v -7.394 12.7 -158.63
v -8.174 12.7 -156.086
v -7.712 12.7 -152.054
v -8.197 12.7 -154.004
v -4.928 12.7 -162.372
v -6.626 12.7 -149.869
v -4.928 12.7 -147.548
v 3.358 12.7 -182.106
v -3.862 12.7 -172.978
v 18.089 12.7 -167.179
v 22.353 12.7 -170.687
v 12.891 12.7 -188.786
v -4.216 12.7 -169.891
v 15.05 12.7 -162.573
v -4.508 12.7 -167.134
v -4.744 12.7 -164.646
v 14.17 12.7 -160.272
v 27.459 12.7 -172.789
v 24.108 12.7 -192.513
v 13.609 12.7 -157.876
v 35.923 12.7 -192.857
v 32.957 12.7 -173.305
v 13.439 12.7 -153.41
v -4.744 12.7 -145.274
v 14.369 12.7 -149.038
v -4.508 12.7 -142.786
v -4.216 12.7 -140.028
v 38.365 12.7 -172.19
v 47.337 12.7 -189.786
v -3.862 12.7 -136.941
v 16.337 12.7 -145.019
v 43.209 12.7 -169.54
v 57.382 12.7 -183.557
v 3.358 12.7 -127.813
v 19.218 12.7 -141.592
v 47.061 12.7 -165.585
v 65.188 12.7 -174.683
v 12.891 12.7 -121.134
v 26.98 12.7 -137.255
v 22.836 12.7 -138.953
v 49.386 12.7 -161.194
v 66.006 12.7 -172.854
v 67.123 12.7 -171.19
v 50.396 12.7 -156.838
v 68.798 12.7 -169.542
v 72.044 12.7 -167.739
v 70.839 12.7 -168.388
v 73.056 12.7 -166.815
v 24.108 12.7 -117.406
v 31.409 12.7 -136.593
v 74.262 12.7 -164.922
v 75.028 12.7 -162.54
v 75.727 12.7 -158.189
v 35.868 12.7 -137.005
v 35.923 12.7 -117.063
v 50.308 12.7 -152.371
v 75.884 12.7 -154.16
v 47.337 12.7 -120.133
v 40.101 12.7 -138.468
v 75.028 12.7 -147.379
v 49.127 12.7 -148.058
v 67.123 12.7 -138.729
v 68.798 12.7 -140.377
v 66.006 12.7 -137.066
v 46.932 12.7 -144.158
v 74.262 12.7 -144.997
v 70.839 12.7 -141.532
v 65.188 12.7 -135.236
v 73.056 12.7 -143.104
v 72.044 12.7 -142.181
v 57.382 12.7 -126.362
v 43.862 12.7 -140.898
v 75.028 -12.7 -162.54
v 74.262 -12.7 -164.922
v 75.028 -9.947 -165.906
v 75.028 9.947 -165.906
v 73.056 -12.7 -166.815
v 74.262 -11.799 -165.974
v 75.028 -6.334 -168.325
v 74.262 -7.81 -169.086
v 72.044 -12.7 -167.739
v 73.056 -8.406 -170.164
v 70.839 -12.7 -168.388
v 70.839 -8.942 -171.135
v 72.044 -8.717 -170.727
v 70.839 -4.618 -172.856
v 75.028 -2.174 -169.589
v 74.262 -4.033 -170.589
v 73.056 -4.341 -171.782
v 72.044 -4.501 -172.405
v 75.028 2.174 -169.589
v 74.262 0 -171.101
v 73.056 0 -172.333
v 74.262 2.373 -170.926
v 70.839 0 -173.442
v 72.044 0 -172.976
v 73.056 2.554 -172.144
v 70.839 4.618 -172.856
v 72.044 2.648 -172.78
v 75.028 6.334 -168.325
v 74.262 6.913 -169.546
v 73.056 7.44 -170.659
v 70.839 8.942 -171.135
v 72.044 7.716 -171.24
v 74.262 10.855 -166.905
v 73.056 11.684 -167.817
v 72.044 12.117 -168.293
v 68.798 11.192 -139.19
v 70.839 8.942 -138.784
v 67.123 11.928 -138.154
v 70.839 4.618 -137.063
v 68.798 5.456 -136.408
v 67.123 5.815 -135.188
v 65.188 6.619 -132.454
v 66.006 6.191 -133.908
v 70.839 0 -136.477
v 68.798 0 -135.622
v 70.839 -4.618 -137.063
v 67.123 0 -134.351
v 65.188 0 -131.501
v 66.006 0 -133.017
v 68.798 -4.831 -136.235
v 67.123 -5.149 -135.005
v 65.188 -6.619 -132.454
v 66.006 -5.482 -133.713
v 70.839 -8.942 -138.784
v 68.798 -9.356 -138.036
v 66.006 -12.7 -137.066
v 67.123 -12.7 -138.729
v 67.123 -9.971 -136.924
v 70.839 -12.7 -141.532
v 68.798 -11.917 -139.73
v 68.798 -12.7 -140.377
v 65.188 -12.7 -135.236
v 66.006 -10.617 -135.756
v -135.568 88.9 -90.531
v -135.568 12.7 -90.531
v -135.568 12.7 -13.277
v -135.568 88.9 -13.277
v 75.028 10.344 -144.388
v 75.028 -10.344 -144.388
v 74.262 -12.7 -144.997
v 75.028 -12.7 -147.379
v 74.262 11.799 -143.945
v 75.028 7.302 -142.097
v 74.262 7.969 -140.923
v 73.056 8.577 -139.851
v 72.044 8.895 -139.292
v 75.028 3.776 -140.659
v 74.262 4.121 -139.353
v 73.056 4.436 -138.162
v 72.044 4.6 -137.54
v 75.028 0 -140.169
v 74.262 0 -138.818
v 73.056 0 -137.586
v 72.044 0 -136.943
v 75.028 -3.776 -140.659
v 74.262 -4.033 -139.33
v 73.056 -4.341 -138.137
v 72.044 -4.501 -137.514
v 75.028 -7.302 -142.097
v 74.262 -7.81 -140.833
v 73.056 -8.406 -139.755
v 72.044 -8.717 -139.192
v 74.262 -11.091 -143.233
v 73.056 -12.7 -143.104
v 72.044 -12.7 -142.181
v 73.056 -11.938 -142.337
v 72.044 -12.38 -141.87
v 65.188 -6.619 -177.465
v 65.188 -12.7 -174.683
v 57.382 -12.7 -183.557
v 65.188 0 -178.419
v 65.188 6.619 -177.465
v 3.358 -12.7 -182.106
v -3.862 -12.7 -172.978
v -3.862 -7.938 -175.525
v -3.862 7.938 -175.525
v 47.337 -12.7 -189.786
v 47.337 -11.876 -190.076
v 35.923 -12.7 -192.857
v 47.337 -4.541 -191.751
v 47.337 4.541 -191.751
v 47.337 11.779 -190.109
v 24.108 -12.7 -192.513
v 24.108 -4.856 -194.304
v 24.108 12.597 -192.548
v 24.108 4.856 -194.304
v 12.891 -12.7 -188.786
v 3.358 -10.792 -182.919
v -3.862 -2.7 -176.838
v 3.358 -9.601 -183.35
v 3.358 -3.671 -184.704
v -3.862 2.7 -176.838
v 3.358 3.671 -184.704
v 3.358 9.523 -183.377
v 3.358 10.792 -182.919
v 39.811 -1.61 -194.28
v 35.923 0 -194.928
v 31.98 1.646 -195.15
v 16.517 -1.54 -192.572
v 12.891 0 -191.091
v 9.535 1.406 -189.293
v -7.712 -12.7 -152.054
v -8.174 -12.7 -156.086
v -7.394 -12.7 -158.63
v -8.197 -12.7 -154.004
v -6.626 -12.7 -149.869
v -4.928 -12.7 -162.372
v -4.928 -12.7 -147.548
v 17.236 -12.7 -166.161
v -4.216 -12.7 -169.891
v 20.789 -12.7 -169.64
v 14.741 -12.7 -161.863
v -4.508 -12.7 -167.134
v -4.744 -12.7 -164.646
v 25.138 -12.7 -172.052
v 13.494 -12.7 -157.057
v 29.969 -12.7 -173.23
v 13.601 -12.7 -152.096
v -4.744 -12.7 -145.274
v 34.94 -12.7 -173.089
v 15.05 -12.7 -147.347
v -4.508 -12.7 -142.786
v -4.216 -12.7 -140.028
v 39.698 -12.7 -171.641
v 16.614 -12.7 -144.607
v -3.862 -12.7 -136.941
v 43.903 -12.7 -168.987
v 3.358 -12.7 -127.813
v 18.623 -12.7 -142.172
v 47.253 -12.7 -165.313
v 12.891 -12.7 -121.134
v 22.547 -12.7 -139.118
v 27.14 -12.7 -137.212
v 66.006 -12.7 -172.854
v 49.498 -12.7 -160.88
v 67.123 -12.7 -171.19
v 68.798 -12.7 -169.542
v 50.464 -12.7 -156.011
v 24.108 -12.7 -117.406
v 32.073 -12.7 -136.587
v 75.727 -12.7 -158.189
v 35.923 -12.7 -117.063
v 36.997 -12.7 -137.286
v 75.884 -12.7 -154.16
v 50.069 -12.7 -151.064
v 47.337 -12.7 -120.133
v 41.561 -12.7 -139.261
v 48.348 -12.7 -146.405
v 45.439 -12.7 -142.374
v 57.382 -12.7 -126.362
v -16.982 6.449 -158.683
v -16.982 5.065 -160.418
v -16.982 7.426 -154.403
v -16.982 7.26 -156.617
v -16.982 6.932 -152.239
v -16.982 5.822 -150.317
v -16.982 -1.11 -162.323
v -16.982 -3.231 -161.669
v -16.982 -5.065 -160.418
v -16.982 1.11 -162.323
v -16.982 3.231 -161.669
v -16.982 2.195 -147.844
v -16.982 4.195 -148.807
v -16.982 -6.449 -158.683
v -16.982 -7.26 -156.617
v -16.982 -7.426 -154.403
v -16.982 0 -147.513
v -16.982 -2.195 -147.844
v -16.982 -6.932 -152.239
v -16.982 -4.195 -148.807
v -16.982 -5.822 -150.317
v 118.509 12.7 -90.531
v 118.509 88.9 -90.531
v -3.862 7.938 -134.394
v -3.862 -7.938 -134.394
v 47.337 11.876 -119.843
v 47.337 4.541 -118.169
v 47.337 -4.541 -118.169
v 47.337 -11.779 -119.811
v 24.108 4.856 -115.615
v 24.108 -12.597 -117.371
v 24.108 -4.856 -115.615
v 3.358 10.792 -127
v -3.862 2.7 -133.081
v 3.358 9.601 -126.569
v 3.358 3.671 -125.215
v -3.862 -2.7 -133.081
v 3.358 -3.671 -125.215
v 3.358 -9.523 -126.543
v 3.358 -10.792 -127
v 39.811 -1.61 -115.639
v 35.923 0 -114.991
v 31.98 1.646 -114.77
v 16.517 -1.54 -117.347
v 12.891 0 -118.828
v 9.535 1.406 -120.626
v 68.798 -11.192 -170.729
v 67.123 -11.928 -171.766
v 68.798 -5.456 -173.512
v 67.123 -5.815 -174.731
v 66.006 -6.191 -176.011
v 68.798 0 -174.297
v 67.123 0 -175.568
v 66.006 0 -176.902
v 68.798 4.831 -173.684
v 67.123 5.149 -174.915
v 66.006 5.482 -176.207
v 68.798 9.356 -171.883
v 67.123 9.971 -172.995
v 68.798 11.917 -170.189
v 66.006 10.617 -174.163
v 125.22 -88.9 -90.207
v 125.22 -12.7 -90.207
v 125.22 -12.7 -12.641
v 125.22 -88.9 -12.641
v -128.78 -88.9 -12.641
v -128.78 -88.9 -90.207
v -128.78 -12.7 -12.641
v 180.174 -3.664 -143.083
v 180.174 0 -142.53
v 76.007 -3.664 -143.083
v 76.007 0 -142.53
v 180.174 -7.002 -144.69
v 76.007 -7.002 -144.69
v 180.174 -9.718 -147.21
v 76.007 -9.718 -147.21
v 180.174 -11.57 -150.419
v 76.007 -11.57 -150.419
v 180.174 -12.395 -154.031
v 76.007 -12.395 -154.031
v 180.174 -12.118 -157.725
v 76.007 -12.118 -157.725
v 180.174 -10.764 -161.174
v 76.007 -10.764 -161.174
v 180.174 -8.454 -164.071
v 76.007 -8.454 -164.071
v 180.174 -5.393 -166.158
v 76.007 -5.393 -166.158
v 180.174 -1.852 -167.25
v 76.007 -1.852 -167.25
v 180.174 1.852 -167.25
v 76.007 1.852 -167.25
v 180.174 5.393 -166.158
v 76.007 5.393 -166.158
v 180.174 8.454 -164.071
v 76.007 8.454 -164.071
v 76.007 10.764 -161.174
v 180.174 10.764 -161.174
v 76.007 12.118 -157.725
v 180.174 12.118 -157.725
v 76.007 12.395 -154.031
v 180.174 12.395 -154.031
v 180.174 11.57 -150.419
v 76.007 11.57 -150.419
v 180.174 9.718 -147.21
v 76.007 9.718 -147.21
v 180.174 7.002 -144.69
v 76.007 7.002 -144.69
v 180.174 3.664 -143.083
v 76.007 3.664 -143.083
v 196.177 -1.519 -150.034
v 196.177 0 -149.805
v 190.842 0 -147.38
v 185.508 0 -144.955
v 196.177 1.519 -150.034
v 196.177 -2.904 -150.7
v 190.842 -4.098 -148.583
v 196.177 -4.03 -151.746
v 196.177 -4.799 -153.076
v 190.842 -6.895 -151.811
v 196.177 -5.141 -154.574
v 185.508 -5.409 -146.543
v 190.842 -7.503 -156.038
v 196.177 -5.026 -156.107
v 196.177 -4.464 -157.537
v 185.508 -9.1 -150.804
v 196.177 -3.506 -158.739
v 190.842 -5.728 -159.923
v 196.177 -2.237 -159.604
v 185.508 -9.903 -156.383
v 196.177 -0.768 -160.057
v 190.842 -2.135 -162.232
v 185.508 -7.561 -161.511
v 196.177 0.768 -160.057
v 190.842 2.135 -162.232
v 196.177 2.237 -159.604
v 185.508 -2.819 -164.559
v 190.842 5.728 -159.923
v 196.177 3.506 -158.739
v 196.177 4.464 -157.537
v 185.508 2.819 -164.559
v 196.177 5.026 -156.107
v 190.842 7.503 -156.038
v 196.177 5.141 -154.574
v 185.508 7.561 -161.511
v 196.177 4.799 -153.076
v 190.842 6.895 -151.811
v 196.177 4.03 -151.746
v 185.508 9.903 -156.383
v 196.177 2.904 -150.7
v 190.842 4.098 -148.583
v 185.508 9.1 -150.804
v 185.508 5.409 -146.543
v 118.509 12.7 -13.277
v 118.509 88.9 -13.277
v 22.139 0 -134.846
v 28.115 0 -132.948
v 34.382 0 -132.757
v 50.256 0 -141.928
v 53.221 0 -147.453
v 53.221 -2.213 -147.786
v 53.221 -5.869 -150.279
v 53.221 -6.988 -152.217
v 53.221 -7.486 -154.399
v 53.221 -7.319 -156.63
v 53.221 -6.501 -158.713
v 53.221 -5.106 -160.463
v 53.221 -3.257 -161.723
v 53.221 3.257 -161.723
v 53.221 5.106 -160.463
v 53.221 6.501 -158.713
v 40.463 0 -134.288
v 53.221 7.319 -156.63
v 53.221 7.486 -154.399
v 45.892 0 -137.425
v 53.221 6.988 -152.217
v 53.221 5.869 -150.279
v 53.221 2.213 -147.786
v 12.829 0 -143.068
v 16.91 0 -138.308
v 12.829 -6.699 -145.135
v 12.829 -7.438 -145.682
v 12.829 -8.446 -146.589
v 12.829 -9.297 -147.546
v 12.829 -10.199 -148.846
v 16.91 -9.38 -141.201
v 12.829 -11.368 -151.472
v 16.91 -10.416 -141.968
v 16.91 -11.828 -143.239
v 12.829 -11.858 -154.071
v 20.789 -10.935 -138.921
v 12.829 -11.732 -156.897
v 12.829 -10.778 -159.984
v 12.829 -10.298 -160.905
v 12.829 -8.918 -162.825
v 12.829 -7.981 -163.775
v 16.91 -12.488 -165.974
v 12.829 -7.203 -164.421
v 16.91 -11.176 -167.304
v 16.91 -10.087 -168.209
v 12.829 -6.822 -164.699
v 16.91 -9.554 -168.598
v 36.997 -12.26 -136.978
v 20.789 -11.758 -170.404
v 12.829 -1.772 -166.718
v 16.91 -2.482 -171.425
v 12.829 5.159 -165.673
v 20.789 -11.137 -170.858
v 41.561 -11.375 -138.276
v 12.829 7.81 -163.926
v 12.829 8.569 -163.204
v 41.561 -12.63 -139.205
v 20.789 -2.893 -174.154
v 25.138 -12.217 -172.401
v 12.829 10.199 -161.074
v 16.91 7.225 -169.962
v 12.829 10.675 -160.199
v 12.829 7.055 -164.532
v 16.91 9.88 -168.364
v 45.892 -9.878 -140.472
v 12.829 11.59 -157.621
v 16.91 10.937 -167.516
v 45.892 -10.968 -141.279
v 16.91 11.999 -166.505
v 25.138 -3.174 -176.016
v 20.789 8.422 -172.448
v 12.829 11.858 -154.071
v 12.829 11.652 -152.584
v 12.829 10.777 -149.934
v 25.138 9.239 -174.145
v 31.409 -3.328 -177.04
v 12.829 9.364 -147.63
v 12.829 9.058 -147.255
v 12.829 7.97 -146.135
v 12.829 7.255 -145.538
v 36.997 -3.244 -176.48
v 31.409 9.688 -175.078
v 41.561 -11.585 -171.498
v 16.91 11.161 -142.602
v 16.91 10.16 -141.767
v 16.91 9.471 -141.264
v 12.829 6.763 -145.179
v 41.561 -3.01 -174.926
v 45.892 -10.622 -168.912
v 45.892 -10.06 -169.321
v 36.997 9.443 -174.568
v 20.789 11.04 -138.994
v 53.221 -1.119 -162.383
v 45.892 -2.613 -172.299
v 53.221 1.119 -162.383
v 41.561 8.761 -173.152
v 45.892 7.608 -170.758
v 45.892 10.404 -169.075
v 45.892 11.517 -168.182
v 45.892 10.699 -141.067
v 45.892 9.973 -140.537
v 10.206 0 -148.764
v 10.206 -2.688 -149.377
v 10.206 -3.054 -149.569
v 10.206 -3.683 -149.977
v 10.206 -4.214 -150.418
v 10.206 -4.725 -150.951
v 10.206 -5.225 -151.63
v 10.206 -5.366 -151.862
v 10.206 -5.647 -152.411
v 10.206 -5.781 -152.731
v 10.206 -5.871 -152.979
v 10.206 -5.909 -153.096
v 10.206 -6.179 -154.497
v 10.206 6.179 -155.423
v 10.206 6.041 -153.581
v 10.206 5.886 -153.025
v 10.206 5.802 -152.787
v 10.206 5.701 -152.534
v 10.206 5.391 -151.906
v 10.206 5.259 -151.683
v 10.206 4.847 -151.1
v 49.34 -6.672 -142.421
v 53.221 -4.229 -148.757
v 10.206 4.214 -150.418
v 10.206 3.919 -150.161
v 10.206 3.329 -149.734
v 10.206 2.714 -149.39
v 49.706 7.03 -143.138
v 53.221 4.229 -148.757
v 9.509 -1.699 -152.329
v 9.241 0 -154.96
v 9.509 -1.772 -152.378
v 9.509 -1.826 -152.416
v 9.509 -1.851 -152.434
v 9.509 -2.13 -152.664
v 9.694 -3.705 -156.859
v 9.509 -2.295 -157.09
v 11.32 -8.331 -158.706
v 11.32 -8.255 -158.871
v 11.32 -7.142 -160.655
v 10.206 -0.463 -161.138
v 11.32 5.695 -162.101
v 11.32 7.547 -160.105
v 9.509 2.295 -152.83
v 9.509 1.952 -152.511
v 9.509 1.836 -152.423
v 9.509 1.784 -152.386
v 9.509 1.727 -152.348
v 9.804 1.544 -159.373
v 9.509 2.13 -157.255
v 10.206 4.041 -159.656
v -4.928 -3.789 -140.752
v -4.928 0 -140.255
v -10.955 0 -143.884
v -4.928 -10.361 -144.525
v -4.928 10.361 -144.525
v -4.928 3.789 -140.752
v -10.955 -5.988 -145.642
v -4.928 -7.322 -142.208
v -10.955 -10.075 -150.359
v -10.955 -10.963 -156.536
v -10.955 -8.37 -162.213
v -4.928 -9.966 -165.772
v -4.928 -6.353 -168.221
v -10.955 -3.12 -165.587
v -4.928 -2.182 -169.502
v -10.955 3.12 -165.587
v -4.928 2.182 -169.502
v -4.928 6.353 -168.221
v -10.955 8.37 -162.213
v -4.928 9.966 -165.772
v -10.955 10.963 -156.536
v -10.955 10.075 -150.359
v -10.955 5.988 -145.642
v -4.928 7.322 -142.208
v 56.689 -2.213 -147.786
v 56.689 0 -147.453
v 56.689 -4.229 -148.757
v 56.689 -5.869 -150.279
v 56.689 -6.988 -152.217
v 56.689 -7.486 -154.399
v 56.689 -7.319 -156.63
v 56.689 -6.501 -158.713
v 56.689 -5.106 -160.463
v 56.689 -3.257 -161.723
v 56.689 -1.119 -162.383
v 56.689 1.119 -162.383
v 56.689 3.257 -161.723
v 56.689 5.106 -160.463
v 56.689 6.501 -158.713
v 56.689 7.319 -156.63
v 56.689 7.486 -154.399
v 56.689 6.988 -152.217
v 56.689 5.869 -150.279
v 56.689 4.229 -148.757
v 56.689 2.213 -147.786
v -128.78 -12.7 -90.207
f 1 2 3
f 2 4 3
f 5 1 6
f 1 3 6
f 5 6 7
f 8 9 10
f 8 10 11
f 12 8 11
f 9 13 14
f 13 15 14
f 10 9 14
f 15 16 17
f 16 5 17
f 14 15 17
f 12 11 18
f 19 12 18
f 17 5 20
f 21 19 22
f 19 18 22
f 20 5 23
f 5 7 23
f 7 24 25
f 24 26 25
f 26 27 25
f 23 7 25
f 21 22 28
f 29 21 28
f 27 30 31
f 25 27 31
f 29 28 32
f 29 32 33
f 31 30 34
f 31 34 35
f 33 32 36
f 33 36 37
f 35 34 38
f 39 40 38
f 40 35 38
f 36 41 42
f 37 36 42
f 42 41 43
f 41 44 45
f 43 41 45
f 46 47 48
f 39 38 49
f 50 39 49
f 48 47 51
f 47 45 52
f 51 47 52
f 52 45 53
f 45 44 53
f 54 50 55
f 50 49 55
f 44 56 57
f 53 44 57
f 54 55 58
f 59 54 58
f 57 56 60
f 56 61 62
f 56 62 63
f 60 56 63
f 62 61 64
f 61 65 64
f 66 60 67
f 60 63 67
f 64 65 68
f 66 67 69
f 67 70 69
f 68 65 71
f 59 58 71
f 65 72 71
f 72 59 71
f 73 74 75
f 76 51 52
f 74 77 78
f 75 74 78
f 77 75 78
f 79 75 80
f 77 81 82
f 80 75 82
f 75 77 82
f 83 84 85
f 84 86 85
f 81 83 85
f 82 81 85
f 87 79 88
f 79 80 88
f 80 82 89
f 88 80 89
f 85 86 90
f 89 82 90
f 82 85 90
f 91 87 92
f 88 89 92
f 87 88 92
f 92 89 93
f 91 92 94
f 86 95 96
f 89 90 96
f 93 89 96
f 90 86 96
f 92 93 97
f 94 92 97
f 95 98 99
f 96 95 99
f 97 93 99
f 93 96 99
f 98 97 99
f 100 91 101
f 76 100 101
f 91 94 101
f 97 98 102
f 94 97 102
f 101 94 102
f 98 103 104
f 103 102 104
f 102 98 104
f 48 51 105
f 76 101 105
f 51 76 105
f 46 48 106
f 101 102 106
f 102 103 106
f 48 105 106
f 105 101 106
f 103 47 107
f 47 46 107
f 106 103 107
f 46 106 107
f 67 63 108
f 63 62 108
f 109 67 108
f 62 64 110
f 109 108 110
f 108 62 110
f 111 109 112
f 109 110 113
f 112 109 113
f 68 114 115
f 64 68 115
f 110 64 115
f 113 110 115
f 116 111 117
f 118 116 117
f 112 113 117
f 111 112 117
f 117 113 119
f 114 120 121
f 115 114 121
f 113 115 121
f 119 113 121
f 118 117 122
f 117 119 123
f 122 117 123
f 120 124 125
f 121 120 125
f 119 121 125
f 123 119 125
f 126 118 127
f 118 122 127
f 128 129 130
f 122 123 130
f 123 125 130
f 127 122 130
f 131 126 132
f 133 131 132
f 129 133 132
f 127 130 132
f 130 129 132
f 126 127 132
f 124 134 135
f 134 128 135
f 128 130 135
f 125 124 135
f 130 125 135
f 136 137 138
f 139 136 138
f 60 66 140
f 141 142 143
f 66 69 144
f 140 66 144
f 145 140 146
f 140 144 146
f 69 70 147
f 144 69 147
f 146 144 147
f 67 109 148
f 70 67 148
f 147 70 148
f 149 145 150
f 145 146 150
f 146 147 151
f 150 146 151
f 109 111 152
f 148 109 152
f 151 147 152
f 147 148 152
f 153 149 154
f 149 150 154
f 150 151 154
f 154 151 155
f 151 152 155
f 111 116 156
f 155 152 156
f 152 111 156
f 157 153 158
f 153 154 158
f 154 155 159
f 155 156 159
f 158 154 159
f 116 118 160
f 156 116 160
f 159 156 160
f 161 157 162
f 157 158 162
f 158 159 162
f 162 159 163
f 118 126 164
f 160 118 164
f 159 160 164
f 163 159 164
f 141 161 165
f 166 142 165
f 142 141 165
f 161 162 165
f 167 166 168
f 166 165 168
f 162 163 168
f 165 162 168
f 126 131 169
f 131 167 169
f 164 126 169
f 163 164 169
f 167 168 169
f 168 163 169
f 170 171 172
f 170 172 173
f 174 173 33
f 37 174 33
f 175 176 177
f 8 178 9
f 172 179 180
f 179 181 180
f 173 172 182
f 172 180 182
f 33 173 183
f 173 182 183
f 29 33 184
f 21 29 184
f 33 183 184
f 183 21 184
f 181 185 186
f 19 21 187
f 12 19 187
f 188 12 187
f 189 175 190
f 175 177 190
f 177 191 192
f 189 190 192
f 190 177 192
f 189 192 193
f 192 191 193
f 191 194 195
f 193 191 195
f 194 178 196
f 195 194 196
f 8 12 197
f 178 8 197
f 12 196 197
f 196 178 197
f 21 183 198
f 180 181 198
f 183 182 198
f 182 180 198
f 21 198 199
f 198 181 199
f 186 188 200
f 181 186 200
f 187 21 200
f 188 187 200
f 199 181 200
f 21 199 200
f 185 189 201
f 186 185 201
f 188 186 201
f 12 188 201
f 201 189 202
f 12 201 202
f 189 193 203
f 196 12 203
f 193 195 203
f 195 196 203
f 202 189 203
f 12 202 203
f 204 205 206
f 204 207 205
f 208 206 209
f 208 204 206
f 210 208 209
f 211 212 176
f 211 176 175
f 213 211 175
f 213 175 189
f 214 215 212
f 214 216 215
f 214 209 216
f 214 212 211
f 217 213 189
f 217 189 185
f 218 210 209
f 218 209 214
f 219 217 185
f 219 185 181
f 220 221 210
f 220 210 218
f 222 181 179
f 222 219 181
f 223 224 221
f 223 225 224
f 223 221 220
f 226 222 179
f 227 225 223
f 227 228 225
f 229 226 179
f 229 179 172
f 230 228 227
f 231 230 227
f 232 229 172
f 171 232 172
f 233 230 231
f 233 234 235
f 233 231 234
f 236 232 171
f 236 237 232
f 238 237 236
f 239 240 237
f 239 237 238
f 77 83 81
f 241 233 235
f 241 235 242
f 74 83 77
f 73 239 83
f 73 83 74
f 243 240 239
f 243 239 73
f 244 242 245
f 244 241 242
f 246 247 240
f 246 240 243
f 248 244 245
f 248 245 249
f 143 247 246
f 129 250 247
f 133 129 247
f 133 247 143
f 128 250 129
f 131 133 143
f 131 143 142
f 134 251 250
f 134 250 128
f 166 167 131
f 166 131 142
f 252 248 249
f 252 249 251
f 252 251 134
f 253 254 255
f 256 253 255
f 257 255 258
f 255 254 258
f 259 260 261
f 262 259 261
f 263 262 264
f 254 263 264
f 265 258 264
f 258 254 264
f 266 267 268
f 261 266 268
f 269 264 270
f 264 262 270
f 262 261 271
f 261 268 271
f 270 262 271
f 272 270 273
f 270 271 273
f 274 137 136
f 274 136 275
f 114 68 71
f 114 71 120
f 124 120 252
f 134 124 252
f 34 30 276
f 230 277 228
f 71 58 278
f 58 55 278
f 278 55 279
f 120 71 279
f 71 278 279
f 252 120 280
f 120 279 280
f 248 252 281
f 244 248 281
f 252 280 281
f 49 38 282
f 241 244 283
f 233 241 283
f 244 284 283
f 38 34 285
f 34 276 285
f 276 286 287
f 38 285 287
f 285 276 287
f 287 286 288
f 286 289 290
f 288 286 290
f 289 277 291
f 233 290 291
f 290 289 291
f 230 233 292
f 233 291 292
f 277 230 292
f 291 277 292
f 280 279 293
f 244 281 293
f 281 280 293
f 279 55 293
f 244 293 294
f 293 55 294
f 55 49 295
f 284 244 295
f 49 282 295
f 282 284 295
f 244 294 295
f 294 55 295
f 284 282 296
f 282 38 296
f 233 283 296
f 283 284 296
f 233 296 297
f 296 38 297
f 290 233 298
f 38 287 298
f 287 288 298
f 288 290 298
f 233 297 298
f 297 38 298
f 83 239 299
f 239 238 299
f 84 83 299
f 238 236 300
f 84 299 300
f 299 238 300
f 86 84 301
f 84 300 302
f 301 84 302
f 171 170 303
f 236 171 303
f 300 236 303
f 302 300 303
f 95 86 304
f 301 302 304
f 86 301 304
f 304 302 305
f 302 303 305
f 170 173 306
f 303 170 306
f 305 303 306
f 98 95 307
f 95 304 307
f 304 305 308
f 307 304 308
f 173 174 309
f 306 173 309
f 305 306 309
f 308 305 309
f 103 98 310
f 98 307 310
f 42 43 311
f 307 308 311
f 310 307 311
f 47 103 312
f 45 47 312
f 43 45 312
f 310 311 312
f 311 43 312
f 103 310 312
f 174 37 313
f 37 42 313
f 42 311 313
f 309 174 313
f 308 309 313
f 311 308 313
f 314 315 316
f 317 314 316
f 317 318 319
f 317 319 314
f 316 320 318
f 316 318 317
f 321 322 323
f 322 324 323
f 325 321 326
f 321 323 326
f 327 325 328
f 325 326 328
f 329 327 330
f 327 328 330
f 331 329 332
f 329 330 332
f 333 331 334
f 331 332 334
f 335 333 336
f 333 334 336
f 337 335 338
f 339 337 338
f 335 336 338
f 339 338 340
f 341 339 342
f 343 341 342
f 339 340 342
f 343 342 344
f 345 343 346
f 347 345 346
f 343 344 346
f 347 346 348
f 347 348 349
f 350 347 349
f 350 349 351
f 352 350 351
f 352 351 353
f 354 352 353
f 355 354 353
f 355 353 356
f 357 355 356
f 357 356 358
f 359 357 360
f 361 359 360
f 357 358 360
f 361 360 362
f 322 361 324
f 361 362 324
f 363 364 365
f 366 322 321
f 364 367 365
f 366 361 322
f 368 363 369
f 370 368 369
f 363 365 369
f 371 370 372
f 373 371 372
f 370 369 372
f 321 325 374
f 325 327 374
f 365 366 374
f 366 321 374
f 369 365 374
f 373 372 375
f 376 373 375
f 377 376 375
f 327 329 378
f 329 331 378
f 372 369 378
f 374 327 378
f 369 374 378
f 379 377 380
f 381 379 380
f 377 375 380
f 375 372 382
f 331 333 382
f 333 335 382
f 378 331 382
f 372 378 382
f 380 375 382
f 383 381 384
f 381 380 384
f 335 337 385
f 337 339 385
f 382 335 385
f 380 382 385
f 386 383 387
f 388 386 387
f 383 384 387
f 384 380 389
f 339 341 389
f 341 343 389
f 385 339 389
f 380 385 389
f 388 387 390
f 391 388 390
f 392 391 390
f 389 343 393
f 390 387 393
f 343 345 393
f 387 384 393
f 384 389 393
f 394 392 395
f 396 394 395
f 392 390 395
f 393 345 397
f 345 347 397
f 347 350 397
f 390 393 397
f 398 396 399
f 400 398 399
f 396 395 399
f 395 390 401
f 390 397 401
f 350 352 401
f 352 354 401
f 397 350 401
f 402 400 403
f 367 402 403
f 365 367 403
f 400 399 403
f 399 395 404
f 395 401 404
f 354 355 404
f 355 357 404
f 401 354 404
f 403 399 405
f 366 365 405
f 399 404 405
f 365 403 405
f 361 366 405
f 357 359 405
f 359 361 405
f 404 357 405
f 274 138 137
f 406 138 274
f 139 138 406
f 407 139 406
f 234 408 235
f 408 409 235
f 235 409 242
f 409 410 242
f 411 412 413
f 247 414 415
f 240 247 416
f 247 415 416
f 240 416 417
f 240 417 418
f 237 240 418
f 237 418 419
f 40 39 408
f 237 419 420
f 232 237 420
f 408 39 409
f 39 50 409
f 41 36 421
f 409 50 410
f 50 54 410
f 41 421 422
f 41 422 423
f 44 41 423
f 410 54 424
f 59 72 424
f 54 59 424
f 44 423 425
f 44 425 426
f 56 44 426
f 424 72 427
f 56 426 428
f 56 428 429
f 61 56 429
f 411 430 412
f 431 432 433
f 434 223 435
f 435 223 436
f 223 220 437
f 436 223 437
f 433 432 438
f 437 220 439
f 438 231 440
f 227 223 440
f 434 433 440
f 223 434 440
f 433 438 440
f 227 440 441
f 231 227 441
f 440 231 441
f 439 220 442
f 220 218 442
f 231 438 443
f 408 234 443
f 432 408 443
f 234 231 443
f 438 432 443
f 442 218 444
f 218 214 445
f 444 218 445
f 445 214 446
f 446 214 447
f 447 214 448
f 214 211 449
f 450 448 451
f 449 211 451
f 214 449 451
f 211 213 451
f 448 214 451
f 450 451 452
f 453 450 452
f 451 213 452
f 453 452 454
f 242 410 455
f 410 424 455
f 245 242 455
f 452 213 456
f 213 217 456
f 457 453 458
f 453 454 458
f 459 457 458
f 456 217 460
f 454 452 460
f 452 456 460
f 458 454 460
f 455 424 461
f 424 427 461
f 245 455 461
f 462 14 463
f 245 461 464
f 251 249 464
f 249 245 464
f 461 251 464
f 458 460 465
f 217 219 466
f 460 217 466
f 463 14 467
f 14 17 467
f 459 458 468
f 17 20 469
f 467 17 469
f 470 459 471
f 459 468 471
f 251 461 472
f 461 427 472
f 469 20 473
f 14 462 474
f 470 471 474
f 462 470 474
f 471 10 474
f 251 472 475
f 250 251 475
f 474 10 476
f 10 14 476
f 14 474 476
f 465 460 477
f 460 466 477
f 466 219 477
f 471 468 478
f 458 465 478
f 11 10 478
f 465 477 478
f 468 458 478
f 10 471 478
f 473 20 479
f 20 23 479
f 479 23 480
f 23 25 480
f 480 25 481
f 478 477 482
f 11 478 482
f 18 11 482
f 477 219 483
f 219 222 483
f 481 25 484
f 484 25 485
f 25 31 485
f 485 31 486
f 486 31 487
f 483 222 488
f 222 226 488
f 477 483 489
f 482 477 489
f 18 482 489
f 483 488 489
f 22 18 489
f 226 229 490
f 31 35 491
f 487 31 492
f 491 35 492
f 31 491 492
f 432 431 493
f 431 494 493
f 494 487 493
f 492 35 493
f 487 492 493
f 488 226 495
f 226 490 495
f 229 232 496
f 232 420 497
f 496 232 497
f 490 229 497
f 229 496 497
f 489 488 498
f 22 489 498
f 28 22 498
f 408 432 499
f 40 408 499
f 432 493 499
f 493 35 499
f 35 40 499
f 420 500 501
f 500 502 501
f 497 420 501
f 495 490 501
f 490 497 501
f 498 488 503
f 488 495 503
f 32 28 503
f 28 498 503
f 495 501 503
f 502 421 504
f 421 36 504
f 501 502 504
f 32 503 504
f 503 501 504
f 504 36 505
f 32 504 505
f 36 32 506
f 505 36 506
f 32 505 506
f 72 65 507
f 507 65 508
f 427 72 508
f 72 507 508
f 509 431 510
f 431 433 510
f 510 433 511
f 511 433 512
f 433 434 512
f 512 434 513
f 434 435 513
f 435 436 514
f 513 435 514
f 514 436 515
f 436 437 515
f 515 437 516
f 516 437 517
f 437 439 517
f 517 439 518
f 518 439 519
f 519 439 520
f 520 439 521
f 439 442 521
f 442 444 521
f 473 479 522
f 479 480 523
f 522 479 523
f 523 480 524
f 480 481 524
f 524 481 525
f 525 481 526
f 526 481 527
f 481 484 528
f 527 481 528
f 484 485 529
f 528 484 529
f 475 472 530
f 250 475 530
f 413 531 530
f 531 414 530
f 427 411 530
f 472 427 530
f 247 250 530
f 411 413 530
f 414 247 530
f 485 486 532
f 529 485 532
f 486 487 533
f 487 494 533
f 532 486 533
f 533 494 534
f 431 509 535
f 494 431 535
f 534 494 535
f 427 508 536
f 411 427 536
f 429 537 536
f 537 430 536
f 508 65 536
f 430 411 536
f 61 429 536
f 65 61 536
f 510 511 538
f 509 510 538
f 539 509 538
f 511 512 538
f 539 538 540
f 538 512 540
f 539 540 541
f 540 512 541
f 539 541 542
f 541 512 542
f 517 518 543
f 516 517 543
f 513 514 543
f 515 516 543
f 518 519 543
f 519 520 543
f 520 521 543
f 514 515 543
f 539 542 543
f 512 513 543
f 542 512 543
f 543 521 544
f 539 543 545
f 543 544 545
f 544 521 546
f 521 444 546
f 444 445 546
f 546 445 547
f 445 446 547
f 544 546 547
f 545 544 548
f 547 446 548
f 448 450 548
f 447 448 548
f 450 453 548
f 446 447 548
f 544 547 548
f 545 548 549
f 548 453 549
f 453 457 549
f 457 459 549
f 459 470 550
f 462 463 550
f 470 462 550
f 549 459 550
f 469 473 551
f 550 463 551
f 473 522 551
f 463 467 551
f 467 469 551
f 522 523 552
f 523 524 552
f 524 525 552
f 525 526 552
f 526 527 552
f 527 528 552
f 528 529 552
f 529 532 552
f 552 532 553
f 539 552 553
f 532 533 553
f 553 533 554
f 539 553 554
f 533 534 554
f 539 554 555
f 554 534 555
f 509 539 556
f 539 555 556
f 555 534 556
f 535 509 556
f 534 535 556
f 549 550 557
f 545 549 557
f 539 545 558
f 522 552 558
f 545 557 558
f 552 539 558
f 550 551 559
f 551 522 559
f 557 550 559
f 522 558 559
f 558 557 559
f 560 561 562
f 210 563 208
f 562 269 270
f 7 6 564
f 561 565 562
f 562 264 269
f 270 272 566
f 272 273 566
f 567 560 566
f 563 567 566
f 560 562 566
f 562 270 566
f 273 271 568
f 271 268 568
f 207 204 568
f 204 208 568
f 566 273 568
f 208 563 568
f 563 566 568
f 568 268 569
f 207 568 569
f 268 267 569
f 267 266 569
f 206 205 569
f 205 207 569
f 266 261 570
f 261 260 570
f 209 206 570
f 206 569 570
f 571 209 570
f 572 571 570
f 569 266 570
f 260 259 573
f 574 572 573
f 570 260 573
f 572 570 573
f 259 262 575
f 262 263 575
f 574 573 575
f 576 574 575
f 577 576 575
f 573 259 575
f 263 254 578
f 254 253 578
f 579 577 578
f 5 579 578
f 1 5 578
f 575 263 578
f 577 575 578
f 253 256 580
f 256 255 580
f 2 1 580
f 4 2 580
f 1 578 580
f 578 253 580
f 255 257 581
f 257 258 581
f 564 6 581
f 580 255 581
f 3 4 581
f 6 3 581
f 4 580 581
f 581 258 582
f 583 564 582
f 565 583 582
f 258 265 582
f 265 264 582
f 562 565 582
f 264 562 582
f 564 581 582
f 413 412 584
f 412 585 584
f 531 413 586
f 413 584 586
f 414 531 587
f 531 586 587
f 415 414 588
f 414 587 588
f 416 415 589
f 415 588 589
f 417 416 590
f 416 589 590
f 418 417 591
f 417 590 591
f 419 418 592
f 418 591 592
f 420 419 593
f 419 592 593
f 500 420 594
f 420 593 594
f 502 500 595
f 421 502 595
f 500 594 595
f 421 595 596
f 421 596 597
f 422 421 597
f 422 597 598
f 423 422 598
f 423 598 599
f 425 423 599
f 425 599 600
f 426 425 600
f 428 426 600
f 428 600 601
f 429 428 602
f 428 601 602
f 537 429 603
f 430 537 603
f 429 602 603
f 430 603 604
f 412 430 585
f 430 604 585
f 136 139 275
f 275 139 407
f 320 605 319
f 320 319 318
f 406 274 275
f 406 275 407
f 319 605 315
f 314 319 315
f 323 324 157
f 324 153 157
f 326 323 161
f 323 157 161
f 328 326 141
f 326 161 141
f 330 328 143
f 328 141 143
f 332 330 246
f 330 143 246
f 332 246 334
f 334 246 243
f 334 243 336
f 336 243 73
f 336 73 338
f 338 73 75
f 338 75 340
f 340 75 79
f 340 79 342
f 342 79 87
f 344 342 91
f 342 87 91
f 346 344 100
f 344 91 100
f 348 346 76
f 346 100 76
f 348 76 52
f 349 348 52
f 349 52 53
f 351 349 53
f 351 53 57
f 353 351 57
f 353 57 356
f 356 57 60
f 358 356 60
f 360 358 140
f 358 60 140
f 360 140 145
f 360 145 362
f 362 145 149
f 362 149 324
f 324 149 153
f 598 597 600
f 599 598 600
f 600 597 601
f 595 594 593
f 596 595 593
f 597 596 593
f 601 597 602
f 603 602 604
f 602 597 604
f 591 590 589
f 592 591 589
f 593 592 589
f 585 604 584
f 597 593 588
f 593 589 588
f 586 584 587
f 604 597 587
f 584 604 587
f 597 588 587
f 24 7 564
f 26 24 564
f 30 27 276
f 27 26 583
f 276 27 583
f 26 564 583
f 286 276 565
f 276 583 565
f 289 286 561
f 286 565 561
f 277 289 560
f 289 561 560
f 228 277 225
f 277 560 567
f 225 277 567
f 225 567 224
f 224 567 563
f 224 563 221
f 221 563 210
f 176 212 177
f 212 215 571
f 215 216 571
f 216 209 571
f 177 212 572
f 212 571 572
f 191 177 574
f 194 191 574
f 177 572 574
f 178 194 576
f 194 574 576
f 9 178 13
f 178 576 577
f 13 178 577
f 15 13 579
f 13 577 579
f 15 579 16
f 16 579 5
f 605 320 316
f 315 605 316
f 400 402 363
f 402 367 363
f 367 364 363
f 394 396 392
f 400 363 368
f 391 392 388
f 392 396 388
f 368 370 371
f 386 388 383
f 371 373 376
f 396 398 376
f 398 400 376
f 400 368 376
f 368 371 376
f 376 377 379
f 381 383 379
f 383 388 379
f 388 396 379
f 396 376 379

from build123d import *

# Parameters (mm, degrees)
F3_W     = 254
F3_H     = 77.5656452438
F4_DEPTH = 76.2
F5_DEPTH = 508
F7_W     = 254.0768384933
F7_H     = 77.2541463375
F8_DEPTH = 76.2
F9_DEPTH = 508


with BuildPart() as f1:
    # F0 (on Front) → F1 (revolve)
    with BuildSketch(Plane.XZ):
        Polygon((76.0066285729, -142.5303369761), (76.0066285729, -154.9596488476), (196.1768120527, -154.9596488476), (196.1768120527, -149.8045623302), (180.1735162735, -142.5303369761), align=None)
        with BuildLine():
            Line((-16.9816333801, -147.5132703781), (-16.9816333801, -154.9596488476))
            Line((-16.9816333801, -154.9596488476), (9.2413164675, -154.9596488476))
            ThreePointArc((9.2413164675, -154.9596488476), (28.1146879115, -132.9475770724), (53.2212257385, -147.4526524544))
            Line((53.2212257385, -147.4526524544), (56.6891767085, -147.4526524544))
            Line((56.6891767085, -147.4526524544), (56.6891767085, -154.9596488476))
            Line((56.6891767085, -154.9596488476), (76.0066285729, -154.9596488476))
            Line((76.0066285729, -154.9596488476), (76.0066285729, -142.5303369761))
            Line((76.0066285729, -142.5303369761), (75.0275660096, -140.1692962516))
            ThreePointArc((75.0275660096, -140.1692962516), (73.3609013597, -137.8381583704), (70.8390763513, -136.4771390819))
            ThreePointArc((70.8390763513, -136.4771390819), (67.4377654065, -134.6426306683), (65.1876702905, -131.5007507801))
            ThreePointArc((65.1876702905, -131.5007507801), (30.305047036, -114.7374551622), (-3.8617295213, -132.9153776169))
            Line((-3.8617295213, -132.9153776169), (-4.9277227372, -140.2549892664))
            Line((-4.9277227372, -140.2549892664), (-16.9816333801, -147.5132703781))
        make_face()
    revolve(axis=Axis((-70.0414925814, 0, -154.9596488476), (1, 0, 0)))



with BuildPart() as f4:
    # F3 (on offset) → F4 (new body)
    with BuildSketch(Plane.XZ.offset(12.7)):
        with Locations((-1.7801262438, -51.4241456985)):
            Rectangle(F3_W, F3_H)
    extrude(amount=F4_DEPTH)


with BuildPart() as f1_1:
    add(f1.part)
    # F5 (cut): a face of the model
    f5_faces = [f4.part.faces().sort_by_distance(p)[0] for p in [
        (-1.7801262438, -50.8, -90.2069683204),
    ]]
    extrude(f5_faces, amount=F5_DEPTH, mode=Mode.SUBTRACT)



with BuildPart() as f8:
    # F7 (on offset) → F8 (new body)
    with BuildSketch(Plane.XZ.offset(-12.7)):
        with Locations((-8.529573679, -51.903963089)):
            Rectangle(F7_W, F7_H)
    extrude(amount=-F8_DEPTH)


with BuildPart() as f1_2:
    add(f1_1.part)
    # F9 (cut): a face of the model
    f9_faces = [f8.part.faces().sort_by_distance(p)[0] for p in [
        (-8.529573679, 50.8, -90.5310362577),
    ]]
    extrude(f9_faces, amount=F9_DEPTH, mode=Mode.SUBTRACT)


solid = Compound([f4.part, f8.part, f1_2.part])
